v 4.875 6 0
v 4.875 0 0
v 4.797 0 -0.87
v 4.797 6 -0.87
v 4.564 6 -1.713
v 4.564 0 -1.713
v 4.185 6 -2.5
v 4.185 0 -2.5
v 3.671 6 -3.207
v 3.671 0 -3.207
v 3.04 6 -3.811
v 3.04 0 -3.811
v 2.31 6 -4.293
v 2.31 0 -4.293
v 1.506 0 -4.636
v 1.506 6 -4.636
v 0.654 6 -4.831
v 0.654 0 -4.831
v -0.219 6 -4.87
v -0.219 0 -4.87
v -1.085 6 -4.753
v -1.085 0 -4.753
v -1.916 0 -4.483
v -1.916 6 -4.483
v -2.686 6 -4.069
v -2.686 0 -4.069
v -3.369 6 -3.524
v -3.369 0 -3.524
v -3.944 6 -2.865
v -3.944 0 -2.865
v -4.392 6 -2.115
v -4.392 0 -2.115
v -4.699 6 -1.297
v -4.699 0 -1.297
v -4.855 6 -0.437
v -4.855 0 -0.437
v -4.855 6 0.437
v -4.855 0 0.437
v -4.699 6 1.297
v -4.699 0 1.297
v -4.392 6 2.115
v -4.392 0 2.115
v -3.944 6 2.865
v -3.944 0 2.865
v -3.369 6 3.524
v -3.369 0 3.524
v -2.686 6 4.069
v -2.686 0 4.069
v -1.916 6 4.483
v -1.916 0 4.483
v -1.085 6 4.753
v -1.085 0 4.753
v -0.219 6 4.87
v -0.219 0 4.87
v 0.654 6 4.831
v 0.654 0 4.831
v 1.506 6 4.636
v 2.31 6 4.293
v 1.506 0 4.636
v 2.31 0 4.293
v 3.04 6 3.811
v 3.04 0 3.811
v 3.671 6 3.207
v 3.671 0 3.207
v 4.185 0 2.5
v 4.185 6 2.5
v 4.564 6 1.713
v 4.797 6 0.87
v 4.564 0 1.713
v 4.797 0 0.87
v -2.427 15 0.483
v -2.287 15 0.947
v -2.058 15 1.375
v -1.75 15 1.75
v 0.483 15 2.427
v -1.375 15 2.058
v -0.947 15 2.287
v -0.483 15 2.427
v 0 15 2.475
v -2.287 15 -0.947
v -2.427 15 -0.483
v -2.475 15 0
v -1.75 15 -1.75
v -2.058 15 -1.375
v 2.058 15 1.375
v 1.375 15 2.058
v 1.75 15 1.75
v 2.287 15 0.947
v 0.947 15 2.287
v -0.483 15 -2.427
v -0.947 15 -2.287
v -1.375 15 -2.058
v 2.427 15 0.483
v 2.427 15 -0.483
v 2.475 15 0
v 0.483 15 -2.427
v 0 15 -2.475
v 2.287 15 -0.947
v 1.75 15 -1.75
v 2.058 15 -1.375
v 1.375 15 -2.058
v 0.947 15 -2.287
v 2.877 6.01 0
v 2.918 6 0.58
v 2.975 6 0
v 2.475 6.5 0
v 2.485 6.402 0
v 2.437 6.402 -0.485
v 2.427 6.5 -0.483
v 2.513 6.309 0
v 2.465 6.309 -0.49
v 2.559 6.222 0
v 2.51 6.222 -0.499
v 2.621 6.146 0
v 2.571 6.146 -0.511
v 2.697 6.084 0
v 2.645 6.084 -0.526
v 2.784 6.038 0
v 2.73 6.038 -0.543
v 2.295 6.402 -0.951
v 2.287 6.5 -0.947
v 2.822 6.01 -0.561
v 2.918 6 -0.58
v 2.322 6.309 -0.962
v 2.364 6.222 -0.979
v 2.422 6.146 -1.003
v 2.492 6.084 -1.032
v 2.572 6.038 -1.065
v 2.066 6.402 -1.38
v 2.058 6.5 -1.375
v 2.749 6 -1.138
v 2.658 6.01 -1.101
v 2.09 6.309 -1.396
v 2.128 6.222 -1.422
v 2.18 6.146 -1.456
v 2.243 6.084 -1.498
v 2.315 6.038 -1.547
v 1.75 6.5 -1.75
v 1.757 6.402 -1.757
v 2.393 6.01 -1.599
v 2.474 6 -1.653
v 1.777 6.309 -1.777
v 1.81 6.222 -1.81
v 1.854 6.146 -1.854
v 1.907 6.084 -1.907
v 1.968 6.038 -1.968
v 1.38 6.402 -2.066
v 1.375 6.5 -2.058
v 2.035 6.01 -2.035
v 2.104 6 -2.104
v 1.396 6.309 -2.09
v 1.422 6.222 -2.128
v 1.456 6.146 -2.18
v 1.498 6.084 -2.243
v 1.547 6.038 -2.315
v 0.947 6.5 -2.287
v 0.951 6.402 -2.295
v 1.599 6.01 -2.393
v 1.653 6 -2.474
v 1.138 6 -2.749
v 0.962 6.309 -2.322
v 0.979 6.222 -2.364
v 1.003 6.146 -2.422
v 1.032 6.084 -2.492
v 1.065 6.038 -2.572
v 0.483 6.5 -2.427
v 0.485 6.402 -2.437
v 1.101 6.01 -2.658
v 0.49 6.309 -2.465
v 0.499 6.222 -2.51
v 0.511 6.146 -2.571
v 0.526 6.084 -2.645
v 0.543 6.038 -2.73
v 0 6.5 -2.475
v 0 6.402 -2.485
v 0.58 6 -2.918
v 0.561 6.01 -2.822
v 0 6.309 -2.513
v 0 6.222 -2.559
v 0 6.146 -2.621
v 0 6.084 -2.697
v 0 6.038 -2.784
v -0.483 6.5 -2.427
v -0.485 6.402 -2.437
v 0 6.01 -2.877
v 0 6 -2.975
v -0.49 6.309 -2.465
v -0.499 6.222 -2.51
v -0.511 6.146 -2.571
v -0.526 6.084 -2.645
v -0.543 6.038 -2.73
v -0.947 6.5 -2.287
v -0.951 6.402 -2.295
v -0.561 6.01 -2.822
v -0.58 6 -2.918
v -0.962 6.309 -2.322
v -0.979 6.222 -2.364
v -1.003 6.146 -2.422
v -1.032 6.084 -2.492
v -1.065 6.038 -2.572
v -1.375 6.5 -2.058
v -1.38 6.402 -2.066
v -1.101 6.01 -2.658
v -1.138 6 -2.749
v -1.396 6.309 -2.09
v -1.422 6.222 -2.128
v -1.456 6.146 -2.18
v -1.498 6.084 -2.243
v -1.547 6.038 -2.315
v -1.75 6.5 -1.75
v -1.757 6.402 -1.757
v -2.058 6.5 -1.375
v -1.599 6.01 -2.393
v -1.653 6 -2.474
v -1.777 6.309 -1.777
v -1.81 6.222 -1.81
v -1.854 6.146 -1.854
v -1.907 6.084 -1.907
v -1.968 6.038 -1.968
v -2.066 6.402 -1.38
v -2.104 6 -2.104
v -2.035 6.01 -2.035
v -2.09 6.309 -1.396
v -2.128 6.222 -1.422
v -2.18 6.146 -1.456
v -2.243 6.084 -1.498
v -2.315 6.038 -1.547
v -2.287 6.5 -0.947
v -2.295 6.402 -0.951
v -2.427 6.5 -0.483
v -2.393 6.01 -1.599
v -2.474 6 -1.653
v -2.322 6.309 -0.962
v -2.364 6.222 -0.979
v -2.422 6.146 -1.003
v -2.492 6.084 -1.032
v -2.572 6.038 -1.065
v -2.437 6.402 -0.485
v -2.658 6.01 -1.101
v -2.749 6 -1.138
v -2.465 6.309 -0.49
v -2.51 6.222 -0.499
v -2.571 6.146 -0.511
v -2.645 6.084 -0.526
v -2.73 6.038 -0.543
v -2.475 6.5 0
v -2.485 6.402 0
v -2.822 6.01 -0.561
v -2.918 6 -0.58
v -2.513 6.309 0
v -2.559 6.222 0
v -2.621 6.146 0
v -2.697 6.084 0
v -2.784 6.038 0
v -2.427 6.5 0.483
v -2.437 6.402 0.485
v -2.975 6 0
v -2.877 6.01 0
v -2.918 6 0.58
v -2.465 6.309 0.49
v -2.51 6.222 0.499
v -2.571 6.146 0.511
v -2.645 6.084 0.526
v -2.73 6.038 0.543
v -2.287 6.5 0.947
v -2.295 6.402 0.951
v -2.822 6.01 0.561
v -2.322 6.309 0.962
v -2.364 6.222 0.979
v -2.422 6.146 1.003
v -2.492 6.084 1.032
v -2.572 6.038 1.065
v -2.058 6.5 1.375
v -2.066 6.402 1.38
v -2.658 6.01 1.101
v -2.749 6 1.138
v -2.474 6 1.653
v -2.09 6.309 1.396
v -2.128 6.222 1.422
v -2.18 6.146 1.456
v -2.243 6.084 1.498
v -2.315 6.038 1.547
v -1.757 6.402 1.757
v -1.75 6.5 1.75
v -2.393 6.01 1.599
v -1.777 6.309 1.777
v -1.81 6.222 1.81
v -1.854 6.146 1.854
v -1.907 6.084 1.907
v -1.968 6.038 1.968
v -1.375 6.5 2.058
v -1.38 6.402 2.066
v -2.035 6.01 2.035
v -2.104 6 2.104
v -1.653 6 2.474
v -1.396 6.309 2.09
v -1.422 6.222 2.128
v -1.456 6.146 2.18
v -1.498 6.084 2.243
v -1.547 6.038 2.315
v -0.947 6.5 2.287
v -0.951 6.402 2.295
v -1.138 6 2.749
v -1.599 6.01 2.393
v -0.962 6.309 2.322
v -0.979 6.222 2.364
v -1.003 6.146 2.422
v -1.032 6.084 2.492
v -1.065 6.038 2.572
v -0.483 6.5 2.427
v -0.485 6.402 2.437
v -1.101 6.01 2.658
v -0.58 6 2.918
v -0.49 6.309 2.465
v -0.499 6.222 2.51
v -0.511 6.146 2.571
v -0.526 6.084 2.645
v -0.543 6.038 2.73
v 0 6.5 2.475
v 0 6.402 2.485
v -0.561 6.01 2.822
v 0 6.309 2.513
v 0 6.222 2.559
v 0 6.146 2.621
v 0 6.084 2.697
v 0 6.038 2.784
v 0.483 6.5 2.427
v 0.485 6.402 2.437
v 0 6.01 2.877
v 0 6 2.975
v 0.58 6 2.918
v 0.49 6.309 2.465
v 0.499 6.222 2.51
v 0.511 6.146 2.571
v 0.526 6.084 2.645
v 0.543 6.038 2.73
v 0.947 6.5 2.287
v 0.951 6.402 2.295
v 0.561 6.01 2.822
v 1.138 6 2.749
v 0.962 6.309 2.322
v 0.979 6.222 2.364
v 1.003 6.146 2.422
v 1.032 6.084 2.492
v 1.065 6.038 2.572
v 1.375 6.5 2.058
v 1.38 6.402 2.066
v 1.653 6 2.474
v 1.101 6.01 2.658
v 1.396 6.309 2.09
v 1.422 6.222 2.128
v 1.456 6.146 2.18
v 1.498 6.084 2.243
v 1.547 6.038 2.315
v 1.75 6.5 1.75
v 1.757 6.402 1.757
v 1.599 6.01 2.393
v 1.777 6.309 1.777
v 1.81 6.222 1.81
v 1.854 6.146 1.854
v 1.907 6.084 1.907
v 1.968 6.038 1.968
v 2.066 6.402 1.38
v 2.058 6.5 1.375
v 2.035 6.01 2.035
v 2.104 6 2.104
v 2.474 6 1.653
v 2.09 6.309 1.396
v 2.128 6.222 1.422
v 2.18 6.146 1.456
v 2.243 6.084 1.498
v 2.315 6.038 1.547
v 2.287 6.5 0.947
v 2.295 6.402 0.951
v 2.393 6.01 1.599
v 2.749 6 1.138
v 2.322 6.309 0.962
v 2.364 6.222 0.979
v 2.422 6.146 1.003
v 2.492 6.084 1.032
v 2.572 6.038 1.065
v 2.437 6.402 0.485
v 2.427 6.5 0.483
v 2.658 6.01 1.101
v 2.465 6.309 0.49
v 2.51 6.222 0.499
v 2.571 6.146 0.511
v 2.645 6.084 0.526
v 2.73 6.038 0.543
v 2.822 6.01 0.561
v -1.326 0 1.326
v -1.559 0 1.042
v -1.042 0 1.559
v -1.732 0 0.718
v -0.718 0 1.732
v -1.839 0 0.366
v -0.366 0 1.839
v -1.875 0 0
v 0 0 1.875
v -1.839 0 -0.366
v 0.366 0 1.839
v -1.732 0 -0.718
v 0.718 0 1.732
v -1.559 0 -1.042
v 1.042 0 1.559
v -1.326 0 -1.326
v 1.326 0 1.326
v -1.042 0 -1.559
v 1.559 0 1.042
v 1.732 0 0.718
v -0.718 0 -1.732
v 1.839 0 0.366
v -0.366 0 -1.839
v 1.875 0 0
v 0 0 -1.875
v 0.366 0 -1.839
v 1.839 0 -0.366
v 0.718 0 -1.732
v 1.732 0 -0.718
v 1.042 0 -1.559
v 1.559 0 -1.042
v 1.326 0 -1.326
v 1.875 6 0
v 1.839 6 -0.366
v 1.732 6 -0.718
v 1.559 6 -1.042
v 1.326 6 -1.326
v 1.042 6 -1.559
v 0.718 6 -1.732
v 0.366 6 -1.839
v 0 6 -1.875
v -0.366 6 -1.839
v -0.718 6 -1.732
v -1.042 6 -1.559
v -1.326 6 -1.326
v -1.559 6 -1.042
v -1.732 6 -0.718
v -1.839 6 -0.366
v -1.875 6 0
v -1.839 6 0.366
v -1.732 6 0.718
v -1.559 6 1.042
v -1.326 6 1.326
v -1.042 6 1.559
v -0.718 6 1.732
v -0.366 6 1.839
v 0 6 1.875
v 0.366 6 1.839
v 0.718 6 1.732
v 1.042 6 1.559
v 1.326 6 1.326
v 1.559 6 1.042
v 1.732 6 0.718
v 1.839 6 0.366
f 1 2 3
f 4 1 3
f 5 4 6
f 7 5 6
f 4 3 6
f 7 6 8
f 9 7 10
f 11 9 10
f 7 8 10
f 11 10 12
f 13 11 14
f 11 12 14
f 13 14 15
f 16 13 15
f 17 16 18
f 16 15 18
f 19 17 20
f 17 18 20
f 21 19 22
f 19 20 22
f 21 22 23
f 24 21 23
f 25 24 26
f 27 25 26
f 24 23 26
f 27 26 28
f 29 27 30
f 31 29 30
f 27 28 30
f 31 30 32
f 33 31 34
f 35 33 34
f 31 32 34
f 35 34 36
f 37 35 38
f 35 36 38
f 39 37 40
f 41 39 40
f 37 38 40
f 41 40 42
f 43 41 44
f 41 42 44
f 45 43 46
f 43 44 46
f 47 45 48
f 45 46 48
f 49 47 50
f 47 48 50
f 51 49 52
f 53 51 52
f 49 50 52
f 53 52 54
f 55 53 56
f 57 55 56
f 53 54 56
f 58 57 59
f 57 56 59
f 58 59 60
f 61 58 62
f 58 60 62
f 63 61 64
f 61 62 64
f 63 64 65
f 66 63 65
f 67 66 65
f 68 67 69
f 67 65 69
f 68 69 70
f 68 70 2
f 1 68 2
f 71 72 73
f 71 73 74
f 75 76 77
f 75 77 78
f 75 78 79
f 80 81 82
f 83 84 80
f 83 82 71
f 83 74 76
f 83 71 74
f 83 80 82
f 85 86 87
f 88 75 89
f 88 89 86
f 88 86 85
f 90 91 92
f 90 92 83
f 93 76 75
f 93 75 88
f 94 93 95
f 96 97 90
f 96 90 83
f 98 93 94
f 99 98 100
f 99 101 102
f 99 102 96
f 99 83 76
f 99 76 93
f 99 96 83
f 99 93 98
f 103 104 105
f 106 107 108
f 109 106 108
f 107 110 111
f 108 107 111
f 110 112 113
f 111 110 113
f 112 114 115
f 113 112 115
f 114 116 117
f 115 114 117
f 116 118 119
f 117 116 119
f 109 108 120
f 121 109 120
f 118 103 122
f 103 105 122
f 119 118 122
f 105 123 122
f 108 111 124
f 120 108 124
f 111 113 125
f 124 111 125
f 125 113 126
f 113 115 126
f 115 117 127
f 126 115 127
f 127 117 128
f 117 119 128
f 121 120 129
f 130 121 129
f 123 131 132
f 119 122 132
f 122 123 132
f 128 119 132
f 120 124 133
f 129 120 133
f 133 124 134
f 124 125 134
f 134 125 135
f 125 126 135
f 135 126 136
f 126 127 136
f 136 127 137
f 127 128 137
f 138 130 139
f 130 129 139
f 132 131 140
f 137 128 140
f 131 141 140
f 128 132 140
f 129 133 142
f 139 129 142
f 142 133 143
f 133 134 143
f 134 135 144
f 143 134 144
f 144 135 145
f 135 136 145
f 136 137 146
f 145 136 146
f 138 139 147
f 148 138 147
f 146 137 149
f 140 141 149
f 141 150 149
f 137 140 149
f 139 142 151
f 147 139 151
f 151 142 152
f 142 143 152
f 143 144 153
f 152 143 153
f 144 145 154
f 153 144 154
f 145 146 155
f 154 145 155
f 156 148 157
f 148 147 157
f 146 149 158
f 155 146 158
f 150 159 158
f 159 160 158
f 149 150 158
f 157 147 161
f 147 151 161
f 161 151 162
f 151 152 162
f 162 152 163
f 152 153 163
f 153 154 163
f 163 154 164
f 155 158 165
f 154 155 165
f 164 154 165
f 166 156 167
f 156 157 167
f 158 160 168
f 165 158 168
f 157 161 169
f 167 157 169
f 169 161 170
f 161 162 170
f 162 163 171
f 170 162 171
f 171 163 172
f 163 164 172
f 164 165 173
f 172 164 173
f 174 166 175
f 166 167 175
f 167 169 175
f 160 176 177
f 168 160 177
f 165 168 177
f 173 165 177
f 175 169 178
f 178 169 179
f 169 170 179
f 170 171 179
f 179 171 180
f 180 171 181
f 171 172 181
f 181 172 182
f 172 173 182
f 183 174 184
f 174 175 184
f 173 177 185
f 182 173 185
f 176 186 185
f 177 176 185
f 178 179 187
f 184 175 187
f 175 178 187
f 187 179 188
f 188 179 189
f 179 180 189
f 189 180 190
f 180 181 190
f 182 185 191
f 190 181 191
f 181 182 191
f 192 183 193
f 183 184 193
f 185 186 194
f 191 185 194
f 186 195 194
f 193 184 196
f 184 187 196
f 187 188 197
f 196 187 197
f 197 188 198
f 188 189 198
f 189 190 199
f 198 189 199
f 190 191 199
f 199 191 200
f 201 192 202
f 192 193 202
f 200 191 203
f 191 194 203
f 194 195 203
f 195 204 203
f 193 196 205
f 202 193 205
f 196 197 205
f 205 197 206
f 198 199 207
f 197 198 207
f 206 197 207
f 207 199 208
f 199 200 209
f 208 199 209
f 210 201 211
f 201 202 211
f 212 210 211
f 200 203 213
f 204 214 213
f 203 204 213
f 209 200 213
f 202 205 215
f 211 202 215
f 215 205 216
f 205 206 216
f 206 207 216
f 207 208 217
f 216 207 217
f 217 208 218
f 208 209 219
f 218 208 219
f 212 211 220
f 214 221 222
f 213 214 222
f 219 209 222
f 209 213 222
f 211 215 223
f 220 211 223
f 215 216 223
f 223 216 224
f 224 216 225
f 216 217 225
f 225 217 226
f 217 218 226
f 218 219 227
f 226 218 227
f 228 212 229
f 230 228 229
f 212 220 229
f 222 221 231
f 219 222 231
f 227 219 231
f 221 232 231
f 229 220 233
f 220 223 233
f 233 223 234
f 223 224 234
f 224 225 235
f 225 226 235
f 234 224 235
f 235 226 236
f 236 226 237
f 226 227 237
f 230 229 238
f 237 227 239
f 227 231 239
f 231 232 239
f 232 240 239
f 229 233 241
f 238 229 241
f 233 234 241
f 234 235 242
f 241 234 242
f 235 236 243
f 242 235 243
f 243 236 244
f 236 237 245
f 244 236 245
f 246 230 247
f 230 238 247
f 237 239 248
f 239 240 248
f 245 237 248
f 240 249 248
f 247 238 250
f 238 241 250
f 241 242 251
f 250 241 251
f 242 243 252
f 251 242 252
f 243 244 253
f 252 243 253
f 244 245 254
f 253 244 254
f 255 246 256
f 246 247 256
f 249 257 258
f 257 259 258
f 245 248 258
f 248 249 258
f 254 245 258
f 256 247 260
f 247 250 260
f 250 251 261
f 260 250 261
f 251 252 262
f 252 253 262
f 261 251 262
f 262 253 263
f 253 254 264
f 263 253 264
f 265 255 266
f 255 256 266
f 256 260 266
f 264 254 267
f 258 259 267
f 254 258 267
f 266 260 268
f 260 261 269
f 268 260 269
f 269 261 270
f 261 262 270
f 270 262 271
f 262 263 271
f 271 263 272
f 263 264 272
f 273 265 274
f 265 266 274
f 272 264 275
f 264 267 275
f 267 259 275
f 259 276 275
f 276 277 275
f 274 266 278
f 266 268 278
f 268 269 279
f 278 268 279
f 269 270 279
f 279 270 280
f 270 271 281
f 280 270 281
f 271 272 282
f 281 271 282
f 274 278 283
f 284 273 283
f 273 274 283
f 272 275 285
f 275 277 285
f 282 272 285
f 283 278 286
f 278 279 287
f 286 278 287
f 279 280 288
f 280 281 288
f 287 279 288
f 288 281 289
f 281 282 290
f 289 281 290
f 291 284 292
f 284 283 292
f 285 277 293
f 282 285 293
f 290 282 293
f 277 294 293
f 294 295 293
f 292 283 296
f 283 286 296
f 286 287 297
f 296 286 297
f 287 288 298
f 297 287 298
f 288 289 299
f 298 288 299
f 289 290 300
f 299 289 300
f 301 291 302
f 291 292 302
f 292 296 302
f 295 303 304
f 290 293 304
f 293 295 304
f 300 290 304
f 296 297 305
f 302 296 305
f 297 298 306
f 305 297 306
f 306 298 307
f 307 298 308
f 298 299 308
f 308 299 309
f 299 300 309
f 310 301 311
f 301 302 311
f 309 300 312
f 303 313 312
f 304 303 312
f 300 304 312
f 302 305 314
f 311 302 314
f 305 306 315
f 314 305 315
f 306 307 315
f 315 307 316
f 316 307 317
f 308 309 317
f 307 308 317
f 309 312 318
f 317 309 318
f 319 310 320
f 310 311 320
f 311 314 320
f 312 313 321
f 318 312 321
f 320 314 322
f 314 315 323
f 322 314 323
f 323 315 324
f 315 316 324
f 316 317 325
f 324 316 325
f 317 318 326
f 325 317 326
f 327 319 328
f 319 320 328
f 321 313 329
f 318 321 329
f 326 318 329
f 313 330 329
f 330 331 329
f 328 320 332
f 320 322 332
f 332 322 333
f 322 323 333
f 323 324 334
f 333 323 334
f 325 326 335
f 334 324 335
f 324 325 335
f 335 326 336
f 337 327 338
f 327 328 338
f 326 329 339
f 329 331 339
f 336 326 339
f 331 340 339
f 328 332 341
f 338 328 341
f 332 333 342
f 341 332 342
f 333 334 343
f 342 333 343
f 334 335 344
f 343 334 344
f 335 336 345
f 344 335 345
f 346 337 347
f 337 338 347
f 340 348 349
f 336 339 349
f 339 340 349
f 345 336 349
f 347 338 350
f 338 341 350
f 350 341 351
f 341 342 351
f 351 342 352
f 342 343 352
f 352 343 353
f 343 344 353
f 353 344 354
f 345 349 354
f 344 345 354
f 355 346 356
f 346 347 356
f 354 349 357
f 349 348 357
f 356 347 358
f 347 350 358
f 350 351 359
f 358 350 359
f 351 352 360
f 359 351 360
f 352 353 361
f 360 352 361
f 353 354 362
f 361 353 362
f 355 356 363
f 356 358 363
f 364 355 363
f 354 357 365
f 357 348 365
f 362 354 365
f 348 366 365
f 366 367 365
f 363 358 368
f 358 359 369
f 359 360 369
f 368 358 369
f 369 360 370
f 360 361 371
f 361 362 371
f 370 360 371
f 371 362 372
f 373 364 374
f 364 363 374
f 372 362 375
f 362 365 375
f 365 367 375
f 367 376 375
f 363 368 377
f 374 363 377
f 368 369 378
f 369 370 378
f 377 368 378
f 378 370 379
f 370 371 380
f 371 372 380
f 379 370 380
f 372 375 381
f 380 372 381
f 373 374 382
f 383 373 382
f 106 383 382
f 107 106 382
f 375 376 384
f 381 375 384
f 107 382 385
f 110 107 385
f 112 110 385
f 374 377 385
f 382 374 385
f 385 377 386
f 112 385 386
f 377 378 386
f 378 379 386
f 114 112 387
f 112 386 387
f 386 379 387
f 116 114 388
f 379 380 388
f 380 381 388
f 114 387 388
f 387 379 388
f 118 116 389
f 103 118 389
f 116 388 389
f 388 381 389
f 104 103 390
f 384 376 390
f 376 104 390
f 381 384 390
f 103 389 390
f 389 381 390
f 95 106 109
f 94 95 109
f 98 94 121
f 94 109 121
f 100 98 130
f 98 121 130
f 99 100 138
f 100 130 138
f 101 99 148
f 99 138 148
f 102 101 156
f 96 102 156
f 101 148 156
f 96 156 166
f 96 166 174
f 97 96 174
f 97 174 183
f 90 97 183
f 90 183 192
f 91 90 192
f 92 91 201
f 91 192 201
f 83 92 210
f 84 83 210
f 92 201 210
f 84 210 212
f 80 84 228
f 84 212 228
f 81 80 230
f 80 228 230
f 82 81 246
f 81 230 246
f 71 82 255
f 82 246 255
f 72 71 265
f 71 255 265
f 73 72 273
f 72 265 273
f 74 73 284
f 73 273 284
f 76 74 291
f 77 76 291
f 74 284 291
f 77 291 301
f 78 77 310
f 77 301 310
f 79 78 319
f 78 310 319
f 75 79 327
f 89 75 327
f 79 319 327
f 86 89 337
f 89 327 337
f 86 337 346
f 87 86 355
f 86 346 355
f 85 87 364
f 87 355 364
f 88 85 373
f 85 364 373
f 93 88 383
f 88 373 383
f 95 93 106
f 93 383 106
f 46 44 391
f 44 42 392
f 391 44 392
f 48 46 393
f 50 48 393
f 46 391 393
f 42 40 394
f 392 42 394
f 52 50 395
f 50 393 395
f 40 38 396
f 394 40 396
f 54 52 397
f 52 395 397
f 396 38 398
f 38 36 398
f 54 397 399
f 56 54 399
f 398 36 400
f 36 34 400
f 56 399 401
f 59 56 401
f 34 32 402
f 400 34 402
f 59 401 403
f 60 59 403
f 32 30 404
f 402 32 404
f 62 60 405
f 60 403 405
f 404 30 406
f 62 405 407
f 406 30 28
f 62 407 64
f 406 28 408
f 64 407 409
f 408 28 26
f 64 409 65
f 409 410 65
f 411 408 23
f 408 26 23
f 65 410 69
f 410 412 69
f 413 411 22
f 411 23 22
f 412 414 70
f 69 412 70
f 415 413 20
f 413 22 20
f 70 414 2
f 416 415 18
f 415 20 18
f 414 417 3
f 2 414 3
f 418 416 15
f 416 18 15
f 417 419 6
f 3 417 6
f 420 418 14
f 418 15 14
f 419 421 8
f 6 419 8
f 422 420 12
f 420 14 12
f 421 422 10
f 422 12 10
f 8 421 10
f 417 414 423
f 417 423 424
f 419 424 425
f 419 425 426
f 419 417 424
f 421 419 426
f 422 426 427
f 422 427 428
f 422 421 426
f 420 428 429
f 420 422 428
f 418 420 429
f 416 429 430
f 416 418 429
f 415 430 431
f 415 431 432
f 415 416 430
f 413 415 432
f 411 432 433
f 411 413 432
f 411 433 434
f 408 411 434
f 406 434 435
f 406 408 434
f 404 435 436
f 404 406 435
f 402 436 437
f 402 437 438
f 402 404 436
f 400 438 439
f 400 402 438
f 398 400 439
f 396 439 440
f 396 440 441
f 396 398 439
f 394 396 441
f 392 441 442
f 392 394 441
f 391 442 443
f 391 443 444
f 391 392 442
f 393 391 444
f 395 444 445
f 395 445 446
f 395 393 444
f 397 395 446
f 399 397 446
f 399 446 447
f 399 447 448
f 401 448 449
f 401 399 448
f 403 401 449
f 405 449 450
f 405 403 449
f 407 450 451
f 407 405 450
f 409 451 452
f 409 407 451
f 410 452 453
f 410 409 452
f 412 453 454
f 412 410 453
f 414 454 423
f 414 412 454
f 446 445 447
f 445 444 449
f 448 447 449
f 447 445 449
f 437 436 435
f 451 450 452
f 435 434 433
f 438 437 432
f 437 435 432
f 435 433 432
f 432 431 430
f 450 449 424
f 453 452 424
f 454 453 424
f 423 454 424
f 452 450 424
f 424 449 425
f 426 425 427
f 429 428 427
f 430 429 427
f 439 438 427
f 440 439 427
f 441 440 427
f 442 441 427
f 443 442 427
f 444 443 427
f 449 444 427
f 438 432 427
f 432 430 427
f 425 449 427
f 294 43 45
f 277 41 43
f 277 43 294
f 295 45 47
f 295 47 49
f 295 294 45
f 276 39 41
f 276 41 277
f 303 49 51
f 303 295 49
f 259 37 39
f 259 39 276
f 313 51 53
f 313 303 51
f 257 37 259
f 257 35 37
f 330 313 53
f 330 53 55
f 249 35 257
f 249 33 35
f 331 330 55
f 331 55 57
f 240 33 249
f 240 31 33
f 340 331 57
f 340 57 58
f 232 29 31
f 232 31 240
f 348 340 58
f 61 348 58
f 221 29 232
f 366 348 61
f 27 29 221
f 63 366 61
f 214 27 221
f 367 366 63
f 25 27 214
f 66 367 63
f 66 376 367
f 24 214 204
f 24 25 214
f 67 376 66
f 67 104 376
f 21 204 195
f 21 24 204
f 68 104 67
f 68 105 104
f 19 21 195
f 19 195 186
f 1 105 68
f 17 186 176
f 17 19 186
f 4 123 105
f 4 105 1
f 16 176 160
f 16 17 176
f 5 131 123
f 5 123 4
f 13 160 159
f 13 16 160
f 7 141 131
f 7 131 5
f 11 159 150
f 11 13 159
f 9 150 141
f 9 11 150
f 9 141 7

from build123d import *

# Parameters (mm, degrees)
SKETCH1_R           = 4.875
SKETCH1_R_2         = 1.875
BOSS_EXTRUDE1_DEPTH = 6
SKETCH2_R           = 2.475
BOSS_EXTRUDE2_DEPTH = 9
FILLET1_R           = 0.5


with BuildPart() as part:
    # Sketch1 → Boss-Extrude1 (new body)
    with BuildSketch(Plane(origin=(0, 0, 0), x_dir=(1, 0, 0), z_dir=(0, 1, 0))):
        Circle(SKETCH1_R)
        Circle(SKETCH1_R_2, mode=Mode.SUBTRACT)
    extrude(amount=BOSS_EXTRUDE1_DEPTH)

    # Sketch2 → Boss-Extrude2 (add)
    with BuildSketch(Plane(origin=(0, 6, 0), x_dir=(1, 0, 0), z_dir=(0, 1, 0))):
        Circle(SKETCH2_R)
    extrude(amount=BOSS_EXTRUDE2_DEPTH)

    # Fillet1
    fillet1_edges = [part.edges().sort_by_distance(p)[0] for p in [
        (-2.475, 6, 0),
    ]]
    fillet(fillet1_edges, radius=FILLET1_R)


solid = part.part
